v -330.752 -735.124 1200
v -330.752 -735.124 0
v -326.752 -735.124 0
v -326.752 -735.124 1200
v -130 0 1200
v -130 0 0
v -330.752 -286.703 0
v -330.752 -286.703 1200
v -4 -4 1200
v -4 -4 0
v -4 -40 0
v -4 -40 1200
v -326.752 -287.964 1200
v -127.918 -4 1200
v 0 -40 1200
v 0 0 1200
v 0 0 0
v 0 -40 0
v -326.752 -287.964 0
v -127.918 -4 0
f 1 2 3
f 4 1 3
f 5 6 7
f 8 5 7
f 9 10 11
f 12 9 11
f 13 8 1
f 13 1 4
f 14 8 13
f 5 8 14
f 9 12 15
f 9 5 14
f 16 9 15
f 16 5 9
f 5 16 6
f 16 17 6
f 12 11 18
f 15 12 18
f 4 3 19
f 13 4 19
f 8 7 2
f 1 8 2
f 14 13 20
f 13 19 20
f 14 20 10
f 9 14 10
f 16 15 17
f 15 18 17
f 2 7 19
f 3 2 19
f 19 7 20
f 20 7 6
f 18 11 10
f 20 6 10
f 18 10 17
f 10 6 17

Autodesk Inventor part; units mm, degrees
ref_plane "YZ Plane" through (0, 0, 0) normal (1, 0, 0) x (0, 1, 0)
ref_plane "XZ Plane" through (0, 0, 0) normal (0, 1, 0) x (-1, 0, 0)
ref_plane "XY Plane" through (0, 0, 0) normal (0, 0, 1) x (1, 0, 0)
sketch "Sketch1" plane through (0, 0, 0) normal (0, 0, 1) x (1, 0, 0)
  line L0 (0, -40) -> (0, 0)
  line L1 (0, 0) -> (-130, 0)
  line L2 (-130, 0) -> (-330.7518, -286.7032)
  line L3 (-330.7518, -286.7032) -> (-330.7518, -735.1242)
  line L4 (-326.7518, -735.1242) -> (-326.7518, -287.9644)
  line L5 (-326.7518, -287.9644) -> (-127.9177, -4)
  line L6 (-127.9177, -4) -> (-4, -4)
  line L7 (-4, -4) -> (-4, -40)
  line L8 (-4, -40) -> (0, -40)
  line L9 (-330.7518, -735.1242) -> (-326.7518, -735.1242)
  dimension "d0" = 40
  dimension "d1" = 130
  dimension "d2" = 125
  dimension "d3" = 350
  dimension "d4" = 448.421
  dimension "d5" = 4
extrude "Extrusion1" add sketch "Sketch1" along normal blind 1200
properties part number "polycarbonate cover" material "Polycarbonate, Smoke"
